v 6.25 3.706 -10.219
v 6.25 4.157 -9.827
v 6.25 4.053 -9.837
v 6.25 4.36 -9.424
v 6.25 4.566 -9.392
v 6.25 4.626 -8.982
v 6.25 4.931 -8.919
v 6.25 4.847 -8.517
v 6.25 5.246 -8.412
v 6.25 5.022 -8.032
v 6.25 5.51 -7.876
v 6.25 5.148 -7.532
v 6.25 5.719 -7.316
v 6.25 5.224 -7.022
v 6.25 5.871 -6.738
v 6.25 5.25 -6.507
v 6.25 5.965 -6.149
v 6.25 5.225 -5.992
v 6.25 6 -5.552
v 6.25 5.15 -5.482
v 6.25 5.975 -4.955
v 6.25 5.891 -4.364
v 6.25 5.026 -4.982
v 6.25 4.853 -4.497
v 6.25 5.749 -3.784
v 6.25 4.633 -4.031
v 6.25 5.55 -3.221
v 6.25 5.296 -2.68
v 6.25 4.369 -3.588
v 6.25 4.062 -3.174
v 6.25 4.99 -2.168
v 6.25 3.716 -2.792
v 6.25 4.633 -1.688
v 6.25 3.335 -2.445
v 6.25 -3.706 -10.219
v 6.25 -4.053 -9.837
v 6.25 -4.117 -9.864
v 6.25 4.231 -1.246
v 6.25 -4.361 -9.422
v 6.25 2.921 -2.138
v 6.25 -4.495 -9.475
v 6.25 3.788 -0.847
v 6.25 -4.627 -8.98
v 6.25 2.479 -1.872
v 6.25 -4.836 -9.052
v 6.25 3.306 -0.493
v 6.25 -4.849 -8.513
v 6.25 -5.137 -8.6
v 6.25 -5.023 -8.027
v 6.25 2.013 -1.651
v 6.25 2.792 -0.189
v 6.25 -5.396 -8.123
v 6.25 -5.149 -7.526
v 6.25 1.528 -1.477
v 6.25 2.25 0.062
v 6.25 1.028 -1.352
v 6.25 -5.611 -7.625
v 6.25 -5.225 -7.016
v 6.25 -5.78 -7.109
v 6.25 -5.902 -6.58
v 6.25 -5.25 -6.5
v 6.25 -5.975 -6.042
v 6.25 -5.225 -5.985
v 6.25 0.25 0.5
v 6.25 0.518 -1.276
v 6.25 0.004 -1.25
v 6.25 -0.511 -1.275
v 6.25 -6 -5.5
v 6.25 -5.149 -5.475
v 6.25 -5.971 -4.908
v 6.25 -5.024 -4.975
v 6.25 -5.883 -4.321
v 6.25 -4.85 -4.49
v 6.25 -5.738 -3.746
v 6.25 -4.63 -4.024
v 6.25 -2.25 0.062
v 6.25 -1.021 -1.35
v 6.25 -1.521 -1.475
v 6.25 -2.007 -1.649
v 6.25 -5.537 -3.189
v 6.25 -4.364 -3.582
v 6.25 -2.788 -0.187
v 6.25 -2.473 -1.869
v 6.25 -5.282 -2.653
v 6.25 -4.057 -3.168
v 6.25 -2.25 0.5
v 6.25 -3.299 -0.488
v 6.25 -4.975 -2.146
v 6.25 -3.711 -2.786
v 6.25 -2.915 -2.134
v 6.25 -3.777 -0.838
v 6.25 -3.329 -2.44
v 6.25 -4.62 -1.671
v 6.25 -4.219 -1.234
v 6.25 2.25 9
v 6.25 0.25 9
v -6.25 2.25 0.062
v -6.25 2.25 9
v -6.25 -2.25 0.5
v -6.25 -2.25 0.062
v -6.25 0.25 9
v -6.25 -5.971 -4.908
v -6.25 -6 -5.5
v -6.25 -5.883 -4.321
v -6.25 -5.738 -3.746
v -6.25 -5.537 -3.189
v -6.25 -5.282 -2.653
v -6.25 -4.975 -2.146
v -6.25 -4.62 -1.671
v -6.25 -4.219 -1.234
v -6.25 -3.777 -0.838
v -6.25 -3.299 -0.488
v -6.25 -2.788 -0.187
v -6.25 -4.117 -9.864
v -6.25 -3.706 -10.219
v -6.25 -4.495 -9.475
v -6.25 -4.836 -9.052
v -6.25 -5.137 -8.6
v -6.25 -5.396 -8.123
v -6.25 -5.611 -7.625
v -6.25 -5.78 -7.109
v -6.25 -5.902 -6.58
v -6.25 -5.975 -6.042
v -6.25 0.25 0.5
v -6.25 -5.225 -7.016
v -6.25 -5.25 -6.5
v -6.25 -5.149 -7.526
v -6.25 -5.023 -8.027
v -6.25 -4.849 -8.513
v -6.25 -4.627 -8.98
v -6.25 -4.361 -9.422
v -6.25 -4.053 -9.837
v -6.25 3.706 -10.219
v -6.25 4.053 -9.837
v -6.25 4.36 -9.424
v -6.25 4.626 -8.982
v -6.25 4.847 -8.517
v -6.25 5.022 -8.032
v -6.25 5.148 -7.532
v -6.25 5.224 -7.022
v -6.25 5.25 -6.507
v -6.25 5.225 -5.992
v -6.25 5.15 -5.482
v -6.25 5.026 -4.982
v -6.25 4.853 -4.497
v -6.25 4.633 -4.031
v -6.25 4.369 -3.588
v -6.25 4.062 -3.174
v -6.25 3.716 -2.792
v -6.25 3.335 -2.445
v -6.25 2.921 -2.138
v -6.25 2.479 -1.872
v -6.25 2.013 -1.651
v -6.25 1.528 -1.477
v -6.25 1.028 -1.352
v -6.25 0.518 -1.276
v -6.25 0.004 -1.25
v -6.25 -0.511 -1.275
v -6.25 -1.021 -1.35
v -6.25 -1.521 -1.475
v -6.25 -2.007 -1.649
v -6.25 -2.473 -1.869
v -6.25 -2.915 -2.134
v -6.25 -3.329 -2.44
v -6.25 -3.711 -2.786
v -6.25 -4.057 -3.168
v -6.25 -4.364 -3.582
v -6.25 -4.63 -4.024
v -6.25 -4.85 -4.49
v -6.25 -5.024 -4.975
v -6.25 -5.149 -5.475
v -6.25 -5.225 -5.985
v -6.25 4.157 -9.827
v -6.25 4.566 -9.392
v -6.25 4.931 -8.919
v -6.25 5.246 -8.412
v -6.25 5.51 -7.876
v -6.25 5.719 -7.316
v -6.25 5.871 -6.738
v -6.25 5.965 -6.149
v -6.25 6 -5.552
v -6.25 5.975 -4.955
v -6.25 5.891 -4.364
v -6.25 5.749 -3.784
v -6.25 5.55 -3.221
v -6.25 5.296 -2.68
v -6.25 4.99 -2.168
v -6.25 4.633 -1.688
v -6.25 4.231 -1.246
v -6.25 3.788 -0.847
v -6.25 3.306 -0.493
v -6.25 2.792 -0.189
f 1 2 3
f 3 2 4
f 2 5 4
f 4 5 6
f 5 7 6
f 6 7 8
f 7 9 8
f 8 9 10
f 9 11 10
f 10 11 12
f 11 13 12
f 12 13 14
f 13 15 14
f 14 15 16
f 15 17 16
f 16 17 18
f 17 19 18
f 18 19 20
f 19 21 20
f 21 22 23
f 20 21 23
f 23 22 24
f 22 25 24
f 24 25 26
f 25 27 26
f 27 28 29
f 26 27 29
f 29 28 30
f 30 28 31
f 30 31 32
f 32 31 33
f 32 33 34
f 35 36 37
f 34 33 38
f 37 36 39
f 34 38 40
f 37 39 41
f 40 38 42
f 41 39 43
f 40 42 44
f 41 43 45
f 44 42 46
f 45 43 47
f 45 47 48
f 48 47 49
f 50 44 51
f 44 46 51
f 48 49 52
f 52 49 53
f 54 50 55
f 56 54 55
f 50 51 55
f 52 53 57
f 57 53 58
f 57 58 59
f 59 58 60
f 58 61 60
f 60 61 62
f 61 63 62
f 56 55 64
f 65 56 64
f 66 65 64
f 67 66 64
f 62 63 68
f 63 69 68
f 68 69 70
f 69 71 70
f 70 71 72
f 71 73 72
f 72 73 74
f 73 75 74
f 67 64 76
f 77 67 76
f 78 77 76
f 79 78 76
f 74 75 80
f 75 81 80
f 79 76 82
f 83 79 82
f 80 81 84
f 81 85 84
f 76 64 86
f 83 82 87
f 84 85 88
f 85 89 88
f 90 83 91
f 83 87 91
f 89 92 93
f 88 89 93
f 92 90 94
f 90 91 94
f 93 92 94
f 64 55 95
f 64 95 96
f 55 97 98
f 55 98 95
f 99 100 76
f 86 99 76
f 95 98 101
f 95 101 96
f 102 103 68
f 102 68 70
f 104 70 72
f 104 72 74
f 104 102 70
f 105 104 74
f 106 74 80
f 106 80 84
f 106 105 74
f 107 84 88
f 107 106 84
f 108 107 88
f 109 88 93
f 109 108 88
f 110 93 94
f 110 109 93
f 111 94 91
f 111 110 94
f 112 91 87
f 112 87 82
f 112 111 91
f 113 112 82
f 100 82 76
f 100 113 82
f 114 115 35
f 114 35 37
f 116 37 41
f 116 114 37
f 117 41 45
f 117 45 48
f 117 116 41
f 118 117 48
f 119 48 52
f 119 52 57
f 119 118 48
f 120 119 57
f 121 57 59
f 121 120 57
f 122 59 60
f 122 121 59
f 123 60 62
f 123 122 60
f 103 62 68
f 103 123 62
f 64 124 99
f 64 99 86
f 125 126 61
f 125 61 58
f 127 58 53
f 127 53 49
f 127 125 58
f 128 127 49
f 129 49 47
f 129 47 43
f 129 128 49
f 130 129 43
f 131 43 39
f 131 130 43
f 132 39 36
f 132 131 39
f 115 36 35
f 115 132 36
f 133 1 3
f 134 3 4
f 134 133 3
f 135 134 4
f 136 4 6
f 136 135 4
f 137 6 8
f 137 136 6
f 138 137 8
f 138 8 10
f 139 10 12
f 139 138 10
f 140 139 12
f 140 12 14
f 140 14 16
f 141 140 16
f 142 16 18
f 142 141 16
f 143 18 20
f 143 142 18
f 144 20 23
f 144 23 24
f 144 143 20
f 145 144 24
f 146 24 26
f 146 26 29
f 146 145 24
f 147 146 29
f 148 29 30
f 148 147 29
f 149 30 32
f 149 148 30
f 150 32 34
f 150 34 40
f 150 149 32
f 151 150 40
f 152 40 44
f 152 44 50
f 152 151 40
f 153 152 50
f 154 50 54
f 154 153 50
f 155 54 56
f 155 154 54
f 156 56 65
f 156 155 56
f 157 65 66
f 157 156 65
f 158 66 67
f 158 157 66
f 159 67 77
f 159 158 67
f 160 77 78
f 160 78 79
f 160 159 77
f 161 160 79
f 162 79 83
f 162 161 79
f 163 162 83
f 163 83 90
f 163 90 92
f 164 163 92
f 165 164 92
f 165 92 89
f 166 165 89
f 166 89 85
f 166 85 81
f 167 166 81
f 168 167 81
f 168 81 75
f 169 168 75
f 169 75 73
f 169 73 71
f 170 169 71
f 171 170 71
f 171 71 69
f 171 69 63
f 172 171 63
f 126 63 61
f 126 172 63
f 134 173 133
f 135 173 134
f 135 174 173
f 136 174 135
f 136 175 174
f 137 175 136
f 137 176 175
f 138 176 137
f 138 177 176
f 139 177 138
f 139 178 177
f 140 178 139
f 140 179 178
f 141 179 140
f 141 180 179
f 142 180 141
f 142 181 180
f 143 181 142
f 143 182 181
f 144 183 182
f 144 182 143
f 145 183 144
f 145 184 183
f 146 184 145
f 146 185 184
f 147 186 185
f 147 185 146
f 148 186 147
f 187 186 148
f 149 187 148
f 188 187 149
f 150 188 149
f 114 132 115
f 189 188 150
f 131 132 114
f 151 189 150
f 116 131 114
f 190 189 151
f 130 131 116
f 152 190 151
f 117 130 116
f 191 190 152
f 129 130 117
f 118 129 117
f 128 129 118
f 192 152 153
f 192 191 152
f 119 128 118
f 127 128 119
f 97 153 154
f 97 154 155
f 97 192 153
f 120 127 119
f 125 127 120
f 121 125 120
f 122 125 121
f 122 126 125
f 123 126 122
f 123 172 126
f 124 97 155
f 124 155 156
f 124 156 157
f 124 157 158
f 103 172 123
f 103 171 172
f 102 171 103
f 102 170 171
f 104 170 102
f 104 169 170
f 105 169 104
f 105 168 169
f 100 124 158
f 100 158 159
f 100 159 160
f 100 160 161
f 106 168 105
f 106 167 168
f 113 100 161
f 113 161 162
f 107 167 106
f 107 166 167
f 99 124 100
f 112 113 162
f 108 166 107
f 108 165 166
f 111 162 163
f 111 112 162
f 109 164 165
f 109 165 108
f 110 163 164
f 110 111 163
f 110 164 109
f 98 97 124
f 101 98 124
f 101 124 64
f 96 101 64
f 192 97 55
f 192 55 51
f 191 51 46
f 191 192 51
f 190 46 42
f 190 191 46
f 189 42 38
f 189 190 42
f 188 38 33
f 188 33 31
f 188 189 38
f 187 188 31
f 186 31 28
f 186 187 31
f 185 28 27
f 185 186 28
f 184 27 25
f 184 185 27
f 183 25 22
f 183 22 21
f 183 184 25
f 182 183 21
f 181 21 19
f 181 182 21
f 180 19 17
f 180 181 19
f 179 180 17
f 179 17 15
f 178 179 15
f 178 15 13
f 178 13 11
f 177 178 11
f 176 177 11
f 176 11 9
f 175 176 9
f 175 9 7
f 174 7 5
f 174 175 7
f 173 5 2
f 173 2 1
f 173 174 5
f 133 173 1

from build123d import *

# Parameters (mm, degrees)
F0_W     = 12.5
F0_H     = 4.5
F1_DEPTH = 0.5
F2_W     = 12.5
F2_H     = 2
F3_DEPTH = 8.5
F5_DEPTH = 12.5


with BuildPart() as f1:
    # F0 (on Top) → F1 (new body)
    with BuildSketch(Plane.XY):
        Rectangle(F0_W, F0_H)
    extrude(amount=F1_DEPTH)

    # F2 (on face) → F3 (join)
    with BuildSketch(Plane.XY.offset(0.5)):
        with Locations((0, 1.25)):
            Rectangle(F2_W, F2_H)
    extrude(amount=F3_DEPTH)

    # F4 (on face) → F5 (join)
    with BuildSketch(Plane(origin=(-6.25, 0, 0), x_dir=(0, -1, 0), z_dir=(-1, 0, 0))):
        with BuildLine():
            ThreePointArc((3.70586, -10.21875), (5.396071, -8.123437), (6, -5.5))
            ThreePointArc((6, -5.5), (4.974937, -2.145898), (2.25, 0.062149))
            Line((2.25, 0.062149), (2.25, 0))
            Line((2.25, 0), (-2.25, 0))
            Line((-2.25, 0), (-2.25, 0.062149))
            ThreePointArc((-2.25, 0.062149), (-5.940731, -4.658743), (-3.70586, -10.21875))
            ThreePointArc((-3.70586, -10.21875), (-2.013298, -1.651378), (5.25, -6.5))
            ThreePointArc((5.25, -6.5), (4.848622, -8.513298), (3.70586, -10.21875))
        make_face()
    extrude(amount=-F5_DEPTH)


solid = f1.part
